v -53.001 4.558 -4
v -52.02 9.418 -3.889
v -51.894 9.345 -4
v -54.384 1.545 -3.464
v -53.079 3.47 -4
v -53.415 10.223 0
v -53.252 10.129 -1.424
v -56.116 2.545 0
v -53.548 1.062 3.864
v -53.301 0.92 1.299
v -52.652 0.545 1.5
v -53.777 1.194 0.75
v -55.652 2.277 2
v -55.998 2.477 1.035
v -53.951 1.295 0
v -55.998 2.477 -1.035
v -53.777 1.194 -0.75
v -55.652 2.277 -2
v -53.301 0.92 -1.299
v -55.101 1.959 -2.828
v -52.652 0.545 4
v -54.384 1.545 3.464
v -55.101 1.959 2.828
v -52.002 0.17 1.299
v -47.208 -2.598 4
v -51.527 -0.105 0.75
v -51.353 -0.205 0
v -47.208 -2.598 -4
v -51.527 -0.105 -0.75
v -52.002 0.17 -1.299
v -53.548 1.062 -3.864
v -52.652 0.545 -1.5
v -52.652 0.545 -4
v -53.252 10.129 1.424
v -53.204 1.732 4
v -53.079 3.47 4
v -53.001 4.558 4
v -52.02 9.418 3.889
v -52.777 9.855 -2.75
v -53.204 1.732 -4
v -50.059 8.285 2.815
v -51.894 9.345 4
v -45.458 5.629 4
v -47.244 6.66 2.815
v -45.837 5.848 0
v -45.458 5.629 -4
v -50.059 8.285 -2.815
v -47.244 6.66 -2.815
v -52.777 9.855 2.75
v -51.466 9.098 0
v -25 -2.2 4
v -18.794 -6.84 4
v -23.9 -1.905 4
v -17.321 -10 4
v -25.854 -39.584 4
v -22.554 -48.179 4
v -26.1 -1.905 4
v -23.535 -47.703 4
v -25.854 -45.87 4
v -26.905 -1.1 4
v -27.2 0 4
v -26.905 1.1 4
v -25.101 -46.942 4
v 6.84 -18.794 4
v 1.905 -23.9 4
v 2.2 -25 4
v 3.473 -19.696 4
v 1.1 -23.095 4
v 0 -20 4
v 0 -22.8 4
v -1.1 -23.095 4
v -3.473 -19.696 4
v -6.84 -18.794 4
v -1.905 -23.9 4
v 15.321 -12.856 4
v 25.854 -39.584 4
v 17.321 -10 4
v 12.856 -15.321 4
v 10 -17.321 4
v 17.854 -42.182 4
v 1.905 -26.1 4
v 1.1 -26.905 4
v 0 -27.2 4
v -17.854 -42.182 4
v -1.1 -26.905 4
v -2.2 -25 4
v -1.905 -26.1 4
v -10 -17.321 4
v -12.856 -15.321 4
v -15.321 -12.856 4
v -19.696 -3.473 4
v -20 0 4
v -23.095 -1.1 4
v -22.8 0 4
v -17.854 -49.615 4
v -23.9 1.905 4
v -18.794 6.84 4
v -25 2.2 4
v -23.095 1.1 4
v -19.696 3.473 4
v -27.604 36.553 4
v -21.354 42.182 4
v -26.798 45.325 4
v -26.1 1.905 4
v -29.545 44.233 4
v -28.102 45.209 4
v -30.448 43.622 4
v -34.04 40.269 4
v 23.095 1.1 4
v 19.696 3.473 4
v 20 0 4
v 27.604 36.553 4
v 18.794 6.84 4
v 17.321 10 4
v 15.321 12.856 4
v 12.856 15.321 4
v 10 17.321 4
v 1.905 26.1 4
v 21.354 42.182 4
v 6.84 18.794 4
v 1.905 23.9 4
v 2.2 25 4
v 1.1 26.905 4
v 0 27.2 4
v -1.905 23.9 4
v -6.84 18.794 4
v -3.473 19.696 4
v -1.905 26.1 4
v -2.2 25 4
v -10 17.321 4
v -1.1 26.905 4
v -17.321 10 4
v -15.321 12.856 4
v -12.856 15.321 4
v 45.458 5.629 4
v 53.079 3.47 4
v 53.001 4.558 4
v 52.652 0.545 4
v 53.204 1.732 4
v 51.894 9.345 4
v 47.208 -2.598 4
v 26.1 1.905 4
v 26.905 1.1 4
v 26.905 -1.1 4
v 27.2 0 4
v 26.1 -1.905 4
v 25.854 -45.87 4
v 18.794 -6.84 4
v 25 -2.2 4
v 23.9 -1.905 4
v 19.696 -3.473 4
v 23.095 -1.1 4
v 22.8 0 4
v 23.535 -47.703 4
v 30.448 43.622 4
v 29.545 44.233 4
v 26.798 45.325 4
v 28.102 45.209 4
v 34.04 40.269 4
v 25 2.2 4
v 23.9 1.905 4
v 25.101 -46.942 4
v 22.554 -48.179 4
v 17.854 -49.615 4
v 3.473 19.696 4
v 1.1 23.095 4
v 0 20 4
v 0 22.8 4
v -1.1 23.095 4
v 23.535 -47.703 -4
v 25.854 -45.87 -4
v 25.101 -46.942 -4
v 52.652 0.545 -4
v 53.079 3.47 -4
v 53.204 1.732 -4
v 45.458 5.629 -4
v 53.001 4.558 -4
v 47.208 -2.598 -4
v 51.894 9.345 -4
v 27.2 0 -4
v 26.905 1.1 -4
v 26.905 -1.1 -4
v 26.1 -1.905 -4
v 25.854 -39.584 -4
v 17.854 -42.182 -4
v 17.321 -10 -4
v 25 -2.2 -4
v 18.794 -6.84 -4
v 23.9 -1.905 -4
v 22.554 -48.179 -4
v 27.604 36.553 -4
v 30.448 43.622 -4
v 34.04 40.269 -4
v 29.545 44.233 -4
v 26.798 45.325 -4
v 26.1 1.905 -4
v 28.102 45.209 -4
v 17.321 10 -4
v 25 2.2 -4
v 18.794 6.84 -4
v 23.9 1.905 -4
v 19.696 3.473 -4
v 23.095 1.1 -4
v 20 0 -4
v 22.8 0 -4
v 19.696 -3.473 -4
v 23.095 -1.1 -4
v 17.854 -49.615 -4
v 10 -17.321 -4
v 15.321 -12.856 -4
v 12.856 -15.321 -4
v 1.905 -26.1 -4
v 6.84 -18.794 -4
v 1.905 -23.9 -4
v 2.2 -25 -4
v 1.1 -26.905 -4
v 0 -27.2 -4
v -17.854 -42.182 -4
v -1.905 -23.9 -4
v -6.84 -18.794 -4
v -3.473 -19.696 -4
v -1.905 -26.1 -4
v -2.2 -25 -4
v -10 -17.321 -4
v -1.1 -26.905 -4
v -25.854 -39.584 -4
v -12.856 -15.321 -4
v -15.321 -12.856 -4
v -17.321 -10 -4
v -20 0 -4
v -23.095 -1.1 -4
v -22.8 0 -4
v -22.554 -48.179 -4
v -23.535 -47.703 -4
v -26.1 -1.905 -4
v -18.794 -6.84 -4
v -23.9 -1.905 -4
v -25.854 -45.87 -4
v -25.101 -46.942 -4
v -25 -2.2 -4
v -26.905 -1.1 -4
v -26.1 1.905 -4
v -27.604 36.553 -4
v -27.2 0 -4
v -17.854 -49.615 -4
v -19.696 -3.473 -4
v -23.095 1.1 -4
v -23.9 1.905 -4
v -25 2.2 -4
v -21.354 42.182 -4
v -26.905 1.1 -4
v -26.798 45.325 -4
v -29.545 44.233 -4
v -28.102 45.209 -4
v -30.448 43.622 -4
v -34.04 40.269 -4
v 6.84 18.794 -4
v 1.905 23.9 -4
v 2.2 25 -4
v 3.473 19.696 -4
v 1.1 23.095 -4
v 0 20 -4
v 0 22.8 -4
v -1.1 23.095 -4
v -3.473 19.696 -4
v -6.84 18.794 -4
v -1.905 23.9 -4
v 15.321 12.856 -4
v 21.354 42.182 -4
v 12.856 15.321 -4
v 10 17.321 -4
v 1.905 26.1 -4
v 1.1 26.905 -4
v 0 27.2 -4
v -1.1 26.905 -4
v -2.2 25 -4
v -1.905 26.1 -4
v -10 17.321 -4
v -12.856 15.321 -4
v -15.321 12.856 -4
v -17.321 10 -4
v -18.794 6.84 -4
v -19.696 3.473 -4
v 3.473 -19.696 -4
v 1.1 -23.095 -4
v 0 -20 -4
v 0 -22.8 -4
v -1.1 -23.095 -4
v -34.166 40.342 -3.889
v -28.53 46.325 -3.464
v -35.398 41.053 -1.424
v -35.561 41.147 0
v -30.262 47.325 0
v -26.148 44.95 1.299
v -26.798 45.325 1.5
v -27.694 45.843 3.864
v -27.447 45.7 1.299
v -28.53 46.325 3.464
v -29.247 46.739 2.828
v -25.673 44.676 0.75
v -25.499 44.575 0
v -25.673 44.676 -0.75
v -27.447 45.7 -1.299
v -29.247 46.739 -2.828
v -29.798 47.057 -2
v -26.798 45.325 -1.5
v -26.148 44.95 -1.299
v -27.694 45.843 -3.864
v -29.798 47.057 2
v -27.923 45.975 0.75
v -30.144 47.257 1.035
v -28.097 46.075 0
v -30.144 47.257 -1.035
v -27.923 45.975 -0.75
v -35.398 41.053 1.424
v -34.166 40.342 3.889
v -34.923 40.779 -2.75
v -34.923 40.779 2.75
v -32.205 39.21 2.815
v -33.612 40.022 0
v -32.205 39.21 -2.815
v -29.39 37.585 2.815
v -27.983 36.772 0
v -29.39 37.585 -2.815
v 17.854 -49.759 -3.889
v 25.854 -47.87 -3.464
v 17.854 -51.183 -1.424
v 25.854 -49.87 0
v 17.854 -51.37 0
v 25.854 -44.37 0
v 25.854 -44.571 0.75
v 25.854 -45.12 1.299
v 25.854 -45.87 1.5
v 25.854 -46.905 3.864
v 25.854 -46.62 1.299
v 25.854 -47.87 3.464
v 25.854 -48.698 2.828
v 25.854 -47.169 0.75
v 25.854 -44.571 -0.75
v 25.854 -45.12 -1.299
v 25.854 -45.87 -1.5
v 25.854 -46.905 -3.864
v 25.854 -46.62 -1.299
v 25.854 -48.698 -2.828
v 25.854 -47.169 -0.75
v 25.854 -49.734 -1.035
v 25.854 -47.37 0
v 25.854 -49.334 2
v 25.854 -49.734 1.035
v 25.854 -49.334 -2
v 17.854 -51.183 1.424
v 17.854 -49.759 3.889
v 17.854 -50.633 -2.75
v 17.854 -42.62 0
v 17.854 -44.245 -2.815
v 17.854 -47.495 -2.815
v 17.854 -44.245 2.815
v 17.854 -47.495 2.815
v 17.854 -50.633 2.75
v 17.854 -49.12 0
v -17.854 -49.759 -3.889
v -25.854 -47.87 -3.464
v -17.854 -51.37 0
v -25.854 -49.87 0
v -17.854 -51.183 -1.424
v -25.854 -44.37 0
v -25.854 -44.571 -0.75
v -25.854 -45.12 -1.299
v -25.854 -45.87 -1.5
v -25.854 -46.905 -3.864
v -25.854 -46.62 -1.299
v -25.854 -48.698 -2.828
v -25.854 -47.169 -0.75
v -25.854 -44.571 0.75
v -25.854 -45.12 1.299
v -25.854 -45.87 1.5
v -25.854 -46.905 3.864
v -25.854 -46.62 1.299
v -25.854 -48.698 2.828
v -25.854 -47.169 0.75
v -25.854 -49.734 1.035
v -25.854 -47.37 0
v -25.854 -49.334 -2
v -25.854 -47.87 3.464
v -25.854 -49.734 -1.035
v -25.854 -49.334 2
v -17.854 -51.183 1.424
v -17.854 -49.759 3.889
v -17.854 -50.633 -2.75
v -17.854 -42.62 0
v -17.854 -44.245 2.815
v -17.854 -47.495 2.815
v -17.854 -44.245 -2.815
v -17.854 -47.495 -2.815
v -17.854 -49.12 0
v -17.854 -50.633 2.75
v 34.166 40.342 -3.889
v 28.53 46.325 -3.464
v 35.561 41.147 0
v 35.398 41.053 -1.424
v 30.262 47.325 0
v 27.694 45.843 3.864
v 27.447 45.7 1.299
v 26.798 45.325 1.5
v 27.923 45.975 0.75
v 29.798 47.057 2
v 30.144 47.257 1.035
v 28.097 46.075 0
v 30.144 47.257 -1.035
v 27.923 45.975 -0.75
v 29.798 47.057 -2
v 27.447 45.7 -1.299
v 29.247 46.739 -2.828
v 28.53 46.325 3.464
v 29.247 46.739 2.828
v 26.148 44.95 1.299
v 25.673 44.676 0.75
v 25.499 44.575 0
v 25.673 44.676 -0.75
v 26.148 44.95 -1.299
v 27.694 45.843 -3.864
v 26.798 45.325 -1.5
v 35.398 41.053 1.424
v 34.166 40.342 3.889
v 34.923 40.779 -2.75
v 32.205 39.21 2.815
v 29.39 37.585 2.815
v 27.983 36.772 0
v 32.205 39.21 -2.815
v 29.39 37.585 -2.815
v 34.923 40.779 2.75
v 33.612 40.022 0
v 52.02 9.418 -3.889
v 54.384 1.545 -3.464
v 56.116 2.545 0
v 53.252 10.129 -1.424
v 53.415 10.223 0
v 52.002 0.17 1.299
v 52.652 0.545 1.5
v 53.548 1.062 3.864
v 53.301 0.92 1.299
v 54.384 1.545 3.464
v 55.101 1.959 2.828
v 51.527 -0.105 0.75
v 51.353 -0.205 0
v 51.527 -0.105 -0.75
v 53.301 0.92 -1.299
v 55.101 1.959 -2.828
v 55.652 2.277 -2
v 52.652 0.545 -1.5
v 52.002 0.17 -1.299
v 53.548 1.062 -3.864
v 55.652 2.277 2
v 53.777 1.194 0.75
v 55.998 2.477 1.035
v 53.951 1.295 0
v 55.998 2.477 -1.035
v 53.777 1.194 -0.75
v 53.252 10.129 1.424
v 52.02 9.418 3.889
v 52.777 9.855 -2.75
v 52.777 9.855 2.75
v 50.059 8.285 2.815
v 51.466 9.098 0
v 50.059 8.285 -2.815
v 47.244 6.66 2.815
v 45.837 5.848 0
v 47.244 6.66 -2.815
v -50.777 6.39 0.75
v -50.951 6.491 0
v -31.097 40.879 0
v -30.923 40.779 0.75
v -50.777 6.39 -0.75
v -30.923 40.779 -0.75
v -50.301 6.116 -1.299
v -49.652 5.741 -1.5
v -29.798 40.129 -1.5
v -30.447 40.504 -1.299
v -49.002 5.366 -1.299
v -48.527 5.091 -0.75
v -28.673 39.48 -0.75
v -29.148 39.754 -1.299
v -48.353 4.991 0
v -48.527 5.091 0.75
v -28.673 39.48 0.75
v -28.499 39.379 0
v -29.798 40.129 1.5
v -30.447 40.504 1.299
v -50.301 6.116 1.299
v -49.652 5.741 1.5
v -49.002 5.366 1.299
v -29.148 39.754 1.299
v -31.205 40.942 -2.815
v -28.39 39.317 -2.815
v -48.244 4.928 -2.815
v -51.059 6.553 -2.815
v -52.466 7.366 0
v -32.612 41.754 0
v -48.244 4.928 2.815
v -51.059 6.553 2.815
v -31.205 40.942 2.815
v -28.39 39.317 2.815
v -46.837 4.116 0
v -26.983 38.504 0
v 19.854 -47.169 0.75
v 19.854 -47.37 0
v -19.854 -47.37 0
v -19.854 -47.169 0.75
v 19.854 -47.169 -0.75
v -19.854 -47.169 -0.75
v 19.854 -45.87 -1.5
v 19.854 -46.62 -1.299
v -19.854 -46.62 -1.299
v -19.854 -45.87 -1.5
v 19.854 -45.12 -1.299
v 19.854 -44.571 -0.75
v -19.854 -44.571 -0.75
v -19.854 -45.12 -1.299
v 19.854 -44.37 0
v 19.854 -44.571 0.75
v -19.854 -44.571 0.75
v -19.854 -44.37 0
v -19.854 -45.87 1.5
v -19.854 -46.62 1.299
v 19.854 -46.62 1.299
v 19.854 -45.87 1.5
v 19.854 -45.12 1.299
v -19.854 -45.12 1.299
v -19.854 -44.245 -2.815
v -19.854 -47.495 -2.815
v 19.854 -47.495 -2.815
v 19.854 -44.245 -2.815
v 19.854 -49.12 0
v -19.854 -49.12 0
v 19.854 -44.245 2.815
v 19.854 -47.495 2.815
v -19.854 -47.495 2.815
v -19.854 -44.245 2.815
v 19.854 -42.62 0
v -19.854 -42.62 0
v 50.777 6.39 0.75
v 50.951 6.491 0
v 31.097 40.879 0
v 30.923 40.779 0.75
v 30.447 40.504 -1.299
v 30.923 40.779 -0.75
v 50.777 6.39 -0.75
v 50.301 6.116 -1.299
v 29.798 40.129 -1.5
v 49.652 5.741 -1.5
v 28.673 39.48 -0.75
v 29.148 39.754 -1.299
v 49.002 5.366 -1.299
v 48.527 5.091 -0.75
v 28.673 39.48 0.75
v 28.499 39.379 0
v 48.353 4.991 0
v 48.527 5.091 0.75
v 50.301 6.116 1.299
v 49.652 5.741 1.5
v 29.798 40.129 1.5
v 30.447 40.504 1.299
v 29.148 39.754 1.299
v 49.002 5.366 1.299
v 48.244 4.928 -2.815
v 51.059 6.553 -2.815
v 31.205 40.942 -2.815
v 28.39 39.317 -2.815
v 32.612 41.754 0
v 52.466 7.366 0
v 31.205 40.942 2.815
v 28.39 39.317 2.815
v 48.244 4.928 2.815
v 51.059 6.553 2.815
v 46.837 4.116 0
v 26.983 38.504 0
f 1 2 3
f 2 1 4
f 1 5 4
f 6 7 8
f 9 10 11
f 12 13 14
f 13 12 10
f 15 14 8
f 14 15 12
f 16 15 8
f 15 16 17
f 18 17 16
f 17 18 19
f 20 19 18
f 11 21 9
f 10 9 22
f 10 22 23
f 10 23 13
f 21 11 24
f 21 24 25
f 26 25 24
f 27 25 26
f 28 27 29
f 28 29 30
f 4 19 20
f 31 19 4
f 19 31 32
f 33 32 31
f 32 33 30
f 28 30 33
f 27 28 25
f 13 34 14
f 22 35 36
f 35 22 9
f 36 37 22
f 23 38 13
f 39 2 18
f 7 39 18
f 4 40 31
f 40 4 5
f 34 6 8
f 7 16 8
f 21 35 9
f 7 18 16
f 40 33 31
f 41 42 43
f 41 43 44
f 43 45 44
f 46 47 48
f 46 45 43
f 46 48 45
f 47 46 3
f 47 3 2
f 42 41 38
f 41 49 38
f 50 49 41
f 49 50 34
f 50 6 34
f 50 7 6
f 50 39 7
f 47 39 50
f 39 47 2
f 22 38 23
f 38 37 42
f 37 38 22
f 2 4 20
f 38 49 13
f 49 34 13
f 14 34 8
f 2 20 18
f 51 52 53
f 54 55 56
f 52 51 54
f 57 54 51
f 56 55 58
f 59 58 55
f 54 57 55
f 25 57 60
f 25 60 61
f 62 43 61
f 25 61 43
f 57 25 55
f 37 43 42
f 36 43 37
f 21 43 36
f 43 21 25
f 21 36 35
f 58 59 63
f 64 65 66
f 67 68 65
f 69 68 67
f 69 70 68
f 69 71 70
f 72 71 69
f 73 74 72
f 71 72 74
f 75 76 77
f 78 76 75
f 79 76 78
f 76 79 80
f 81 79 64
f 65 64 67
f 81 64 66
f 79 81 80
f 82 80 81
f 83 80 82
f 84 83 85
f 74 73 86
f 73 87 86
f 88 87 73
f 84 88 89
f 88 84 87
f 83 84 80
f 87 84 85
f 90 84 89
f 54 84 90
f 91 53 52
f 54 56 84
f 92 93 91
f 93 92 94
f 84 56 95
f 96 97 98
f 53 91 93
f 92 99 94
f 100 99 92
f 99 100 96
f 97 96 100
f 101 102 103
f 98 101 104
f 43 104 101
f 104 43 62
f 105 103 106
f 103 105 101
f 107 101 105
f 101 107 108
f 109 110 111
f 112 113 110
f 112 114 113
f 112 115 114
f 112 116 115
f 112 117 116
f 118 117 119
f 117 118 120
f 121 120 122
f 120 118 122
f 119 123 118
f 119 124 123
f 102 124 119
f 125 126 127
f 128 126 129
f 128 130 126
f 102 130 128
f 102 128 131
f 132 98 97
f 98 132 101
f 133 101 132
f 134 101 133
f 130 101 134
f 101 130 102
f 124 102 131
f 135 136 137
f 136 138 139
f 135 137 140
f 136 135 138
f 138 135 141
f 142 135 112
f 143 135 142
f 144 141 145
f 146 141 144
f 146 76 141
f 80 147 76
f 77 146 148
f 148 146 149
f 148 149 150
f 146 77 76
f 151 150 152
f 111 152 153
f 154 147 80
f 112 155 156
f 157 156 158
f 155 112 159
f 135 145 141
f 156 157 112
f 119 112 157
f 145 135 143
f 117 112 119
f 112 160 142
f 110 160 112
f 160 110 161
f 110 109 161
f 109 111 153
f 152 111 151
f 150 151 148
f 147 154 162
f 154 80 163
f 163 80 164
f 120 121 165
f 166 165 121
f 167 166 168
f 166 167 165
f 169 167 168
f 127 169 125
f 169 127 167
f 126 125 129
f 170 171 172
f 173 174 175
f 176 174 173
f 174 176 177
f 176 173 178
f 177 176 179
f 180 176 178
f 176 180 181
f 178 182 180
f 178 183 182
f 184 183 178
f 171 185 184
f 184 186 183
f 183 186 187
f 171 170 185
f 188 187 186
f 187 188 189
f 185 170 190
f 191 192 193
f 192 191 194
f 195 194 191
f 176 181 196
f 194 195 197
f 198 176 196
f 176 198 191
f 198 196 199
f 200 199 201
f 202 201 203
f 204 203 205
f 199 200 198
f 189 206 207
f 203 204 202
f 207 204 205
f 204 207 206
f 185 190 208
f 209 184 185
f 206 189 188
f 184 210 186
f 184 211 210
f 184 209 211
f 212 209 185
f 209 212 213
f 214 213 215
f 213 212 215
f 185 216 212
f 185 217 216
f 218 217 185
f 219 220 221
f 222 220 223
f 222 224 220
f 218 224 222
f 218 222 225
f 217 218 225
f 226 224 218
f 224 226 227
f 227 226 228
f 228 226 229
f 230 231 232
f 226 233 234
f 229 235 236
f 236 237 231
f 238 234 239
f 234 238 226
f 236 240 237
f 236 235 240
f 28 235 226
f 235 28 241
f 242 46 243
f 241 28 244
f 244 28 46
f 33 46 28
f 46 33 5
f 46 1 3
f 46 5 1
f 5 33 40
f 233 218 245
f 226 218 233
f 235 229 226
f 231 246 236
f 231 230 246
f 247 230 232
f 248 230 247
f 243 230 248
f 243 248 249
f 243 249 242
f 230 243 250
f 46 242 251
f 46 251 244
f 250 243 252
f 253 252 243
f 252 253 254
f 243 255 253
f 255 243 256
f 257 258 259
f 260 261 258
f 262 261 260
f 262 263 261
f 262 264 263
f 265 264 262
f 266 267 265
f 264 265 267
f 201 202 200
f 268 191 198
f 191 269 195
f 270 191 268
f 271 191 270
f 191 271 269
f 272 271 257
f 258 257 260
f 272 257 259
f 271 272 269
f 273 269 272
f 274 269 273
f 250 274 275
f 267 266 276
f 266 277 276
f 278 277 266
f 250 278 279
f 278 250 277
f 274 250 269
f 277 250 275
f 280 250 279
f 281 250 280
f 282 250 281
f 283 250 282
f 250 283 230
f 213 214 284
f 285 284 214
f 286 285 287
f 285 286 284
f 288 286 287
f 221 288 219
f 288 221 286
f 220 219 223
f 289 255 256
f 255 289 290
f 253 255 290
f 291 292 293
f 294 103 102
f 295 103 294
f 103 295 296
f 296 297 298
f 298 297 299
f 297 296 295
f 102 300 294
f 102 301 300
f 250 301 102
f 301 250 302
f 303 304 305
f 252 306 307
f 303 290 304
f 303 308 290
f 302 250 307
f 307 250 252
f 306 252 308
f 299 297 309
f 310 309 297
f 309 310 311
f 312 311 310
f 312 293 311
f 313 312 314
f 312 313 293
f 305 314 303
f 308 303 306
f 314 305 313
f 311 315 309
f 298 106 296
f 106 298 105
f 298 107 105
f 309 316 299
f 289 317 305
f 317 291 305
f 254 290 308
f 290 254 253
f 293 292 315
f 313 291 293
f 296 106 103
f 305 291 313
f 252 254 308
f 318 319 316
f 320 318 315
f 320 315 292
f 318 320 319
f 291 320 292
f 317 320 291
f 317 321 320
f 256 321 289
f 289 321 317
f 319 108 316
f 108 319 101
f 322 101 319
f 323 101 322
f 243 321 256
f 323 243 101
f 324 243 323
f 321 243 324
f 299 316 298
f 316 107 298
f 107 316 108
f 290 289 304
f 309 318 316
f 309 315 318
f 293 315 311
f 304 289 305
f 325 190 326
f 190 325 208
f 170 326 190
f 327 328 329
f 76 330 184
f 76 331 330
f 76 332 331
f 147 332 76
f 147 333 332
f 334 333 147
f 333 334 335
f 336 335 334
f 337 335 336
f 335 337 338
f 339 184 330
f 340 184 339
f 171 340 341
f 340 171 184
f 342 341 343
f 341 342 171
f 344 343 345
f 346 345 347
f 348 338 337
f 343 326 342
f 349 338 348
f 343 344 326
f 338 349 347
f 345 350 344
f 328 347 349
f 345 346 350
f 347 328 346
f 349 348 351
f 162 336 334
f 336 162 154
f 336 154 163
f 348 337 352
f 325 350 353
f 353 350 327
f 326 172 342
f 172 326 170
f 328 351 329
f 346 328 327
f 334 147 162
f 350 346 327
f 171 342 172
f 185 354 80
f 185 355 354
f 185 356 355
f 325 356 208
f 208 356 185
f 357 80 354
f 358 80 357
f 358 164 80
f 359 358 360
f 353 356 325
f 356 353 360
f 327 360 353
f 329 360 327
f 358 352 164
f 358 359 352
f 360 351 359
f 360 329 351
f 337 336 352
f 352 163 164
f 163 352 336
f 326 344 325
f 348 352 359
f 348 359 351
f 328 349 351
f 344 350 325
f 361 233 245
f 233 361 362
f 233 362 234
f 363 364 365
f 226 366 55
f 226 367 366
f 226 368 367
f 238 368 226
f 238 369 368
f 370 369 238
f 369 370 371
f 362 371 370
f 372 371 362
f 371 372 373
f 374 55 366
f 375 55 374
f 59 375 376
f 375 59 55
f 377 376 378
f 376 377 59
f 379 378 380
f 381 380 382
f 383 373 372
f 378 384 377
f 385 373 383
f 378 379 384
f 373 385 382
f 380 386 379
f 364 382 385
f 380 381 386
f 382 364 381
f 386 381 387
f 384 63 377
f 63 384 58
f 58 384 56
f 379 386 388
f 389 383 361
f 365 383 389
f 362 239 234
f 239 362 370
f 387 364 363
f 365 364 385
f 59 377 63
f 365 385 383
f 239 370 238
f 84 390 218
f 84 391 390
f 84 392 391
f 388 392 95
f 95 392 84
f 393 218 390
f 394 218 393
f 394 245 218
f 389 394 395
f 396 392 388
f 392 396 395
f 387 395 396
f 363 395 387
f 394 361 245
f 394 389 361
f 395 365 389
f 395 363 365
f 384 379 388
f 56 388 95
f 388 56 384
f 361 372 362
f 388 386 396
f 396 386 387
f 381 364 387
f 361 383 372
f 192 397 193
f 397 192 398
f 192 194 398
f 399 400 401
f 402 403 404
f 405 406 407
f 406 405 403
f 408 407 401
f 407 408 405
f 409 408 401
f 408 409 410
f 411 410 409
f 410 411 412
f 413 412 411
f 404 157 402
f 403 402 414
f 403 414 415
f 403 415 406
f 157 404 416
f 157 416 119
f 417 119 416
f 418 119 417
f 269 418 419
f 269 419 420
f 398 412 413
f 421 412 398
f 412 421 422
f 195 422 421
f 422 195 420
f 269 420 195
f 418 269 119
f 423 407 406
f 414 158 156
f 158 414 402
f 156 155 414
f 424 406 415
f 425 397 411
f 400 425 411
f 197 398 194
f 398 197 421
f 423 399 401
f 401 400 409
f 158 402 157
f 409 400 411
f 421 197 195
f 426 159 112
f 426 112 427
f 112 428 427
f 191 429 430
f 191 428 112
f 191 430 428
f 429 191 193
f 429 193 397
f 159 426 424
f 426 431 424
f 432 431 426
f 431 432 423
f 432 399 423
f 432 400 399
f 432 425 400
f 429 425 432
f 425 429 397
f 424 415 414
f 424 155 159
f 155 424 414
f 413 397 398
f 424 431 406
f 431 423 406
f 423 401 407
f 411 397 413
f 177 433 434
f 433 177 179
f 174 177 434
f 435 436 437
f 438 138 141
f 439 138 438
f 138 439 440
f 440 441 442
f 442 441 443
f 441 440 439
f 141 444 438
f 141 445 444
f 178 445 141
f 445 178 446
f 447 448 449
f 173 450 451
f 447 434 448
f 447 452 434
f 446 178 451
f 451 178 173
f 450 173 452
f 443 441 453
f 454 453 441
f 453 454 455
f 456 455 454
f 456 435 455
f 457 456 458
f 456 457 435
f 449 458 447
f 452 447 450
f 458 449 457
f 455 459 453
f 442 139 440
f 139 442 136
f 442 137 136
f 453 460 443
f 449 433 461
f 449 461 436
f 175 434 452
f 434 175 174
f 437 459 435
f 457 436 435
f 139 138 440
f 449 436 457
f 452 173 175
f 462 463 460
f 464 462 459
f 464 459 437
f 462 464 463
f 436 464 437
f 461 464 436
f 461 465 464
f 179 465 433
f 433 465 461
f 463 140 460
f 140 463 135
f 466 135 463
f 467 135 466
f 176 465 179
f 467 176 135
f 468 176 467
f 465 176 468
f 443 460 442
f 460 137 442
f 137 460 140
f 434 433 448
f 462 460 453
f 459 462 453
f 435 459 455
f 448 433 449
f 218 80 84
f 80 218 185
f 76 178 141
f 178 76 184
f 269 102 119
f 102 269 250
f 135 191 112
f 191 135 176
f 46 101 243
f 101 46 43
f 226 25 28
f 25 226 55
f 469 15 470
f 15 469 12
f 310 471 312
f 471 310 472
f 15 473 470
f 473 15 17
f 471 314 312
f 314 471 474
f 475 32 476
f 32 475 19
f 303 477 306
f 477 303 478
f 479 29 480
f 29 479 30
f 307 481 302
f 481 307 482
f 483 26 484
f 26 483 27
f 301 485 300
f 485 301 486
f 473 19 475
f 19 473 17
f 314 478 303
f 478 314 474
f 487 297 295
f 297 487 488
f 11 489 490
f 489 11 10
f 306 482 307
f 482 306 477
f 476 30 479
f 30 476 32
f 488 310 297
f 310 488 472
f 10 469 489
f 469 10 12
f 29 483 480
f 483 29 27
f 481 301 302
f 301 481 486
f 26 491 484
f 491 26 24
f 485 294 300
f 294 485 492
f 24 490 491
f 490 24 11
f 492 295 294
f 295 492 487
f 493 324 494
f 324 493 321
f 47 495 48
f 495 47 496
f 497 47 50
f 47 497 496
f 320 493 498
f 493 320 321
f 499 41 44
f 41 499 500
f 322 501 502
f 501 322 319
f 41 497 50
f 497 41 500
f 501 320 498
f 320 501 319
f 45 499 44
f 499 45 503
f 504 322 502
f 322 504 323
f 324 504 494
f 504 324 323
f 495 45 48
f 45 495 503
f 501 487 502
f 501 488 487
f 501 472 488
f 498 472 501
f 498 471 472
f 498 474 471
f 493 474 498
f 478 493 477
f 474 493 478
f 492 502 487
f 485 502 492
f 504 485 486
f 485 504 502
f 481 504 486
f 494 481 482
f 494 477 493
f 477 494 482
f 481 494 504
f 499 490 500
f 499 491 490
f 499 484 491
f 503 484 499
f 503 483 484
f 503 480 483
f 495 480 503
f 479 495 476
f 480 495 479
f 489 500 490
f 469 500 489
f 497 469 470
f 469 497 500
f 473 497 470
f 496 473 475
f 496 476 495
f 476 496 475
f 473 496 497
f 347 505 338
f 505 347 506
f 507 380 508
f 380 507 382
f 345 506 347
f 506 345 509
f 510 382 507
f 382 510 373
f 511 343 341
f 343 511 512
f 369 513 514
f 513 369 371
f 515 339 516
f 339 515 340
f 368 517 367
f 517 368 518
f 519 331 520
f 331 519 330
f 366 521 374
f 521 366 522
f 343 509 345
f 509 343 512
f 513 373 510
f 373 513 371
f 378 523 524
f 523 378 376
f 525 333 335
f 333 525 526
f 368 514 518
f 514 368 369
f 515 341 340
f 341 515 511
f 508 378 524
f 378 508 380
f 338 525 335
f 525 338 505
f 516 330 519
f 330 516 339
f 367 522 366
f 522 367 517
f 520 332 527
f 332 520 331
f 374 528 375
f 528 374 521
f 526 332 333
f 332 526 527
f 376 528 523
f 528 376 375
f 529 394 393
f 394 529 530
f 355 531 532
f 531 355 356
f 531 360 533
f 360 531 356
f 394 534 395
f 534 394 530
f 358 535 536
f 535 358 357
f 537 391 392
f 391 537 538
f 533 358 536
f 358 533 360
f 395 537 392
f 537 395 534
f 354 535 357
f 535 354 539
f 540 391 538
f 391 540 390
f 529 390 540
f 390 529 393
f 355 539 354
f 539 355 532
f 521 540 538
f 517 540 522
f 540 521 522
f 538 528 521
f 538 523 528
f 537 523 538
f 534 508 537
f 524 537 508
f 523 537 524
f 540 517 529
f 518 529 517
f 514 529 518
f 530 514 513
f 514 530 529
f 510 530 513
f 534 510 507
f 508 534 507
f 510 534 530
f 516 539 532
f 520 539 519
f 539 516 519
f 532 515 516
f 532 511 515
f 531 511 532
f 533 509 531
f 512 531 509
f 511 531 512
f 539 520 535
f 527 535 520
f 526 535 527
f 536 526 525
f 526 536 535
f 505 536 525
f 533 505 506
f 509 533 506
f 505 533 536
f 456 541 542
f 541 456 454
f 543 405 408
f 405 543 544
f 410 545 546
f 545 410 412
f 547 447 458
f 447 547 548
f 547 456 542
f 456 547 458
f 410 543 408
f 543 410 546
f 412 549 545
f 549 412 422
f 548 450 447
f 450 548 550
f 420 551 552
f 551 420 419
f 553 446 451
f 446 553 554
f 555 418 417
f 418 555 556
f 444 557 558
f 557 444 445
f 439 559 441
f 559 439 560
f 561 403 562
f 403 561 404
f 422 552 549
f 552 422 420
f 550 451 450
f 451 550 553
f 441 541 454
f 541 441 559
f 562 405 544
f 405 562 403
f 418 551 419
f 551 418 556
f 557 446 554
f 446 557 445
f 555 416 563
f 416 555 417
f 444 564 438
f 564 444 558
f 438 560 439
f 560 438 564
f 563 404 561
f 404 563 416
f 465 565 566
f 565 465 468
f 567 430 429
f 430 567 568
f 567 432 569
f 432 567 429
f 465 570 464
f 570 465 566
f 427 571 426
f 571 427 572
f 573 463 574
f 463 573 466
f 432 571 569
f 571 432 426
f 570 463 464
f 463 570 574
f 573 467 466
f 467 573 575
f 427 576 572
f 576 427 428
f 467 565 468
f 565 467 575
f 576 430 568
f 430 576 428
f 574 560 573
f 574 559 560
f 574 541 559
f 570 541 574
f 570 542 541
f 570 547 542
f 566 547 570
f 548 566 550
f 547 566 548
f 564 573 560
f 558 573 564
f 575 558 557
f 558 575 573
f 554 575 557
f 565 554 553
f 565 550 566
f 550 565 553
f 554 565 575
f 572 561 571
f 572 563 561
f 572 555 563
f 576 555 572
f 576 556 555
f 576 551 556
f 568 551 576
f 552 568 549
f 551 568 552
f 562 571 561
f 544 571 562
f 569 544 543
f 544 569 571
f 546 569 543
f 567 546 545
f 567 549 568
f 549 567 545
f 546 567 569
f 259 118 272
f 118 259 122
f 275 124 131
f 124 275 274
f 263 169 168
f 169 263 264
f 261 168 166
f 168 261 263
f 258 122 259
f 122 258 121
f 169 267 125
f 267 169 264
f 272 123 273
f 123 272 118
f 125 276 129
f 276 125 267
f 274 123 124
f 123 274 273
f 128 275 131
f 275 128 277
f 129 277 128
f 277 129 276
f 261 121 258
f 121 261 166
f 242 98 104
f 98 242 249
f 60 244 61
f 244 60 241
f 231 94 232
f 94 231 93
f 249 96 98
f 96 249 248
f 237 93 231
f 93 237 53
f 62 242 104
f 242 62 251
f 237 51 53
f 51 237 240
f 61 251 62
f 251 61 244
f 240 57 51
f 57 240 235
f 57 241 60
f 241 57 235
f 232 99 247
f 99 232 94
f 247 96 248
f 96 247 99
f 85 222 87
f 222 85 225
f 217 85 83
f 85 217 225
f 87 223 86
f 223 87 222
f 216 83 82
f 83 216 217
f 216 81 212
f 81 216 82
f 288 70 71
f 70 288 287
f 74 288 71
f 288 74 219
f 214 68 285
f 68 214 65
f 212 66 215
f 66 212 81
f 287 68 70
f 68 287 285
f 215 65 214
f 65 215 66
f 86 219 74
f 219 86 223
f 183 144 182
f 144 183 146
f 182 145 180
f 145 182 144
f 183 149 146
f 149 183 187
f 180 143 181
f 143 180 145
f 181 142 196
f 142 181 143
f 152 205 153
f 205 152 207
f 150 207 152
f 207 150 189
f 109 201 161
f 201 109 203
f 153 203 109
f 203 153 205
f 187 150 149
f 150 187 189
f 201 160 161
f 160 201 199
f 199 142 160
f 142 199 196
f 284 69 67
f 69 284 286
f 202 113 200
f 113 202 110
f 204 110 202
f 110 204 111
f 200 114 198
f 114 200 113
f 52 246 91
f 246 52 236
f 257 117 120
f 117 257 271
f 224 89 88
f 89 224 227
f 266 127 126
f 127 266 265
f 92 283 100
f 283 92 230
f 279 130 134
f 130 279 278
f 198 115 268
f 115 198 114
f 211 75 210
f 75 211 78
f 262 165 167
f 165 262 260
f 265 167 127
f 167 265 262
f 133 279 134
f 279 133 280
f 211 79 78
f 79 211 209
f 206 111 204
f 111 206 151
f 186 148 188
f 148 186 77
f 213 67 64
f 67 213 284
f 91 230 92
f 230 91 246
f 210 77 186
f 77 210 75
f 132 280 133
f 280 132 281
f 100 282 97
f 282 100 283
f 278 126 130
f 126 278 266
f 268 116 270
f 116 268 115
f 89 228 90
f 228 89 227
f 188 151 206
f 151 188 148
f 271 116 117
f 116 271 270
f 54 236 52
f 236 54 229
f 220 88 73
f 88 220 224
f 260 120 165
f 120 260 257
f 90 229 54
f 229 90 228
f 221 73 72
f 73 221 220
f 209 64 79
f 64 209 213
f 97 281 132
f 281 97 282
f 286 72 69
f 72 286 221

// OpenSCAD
// file: configuration.scad
// Increase this if your slicer or printer make holes too tight.
extra_radius = 0.0;

// OD = outside diameter, corner to corner.
m3_nut_od = 6.1;
m3_nut_radius = m3_nut_od/2 + 0.2 + extra_radius;

// Major diameter of metric 3mm thread.
m3_major = 2.85;
m3_radius = m3_major/2 + extra_radius;
m3_wide_radius = m3_major/2 + 0.2 + extra_radius;

// NEMA17 stepper motors.
motor_shaft_diameter = 5;
motor_shaft_radius = motor_shaft_diameter/2 + extra_radius;

// Frame brackets.
thickness = 3.6;
// main file
include <configuration.scad>;

ratio= 1.39;
separation = 37.2*ratio;
radius = 33*ratio;
height = 8;
cone_r1 = height/2;
cone_r2 = 5.5;

echo("Separation= ", separation);
echo("Radius= ", radius);

difference() {
  union() {
    cylinder(r=separation-3, h=height, center=true, $fn=6);
    for (a = [60:120:359]) rotate([0, 0, a]) {
      translate([0, radius, 0]) intersection() {
        cube([separation, 20, height], center=true);
        union() {
          for (s = [-1, 1]) scale([s, 1, 1]) {
            translate([separation/2-4, 0, 0]) rotate([0, 90, 0])
              cylinder(r1=cone_r2, r2=cone_r1, h=8, center=true, $fn=24);
            translate([separation/2-4, -5, 0])
              cube([8, 10, height], center=true);
          }
        }
      }
    }
  }
  for (a = [60:120:359]) rotate([0, 0, a]) {
    translate([0, radius, 0]) rotate([0, 90, 0])
      cylinder(r=1.5, h=separation+1, center=true, $fn=12);
    translate([0, radius, 0]) rotate([90, 0, 90])
      cylinder(r=m3_nut_radius, h=separation-12, center=true, $fn=6);
  }
  cylinder(r=20, h=height+1, center=true, $fn=36);
  for (a = [0:90:359]) rotate([0, 0, a]) {
    translate([0, 25, 0])
      cylinder(r=2.2, h=2*height, center=true, $fn=12);
  }
}

%cylinder(r= radius, h=2);
%rotate([0,90,180]) translate([0, radius, 0]) cylinder(r= 3/2, h= separation, center=true);

//translate([0, 0, 10])  import("new-effector.stl");
